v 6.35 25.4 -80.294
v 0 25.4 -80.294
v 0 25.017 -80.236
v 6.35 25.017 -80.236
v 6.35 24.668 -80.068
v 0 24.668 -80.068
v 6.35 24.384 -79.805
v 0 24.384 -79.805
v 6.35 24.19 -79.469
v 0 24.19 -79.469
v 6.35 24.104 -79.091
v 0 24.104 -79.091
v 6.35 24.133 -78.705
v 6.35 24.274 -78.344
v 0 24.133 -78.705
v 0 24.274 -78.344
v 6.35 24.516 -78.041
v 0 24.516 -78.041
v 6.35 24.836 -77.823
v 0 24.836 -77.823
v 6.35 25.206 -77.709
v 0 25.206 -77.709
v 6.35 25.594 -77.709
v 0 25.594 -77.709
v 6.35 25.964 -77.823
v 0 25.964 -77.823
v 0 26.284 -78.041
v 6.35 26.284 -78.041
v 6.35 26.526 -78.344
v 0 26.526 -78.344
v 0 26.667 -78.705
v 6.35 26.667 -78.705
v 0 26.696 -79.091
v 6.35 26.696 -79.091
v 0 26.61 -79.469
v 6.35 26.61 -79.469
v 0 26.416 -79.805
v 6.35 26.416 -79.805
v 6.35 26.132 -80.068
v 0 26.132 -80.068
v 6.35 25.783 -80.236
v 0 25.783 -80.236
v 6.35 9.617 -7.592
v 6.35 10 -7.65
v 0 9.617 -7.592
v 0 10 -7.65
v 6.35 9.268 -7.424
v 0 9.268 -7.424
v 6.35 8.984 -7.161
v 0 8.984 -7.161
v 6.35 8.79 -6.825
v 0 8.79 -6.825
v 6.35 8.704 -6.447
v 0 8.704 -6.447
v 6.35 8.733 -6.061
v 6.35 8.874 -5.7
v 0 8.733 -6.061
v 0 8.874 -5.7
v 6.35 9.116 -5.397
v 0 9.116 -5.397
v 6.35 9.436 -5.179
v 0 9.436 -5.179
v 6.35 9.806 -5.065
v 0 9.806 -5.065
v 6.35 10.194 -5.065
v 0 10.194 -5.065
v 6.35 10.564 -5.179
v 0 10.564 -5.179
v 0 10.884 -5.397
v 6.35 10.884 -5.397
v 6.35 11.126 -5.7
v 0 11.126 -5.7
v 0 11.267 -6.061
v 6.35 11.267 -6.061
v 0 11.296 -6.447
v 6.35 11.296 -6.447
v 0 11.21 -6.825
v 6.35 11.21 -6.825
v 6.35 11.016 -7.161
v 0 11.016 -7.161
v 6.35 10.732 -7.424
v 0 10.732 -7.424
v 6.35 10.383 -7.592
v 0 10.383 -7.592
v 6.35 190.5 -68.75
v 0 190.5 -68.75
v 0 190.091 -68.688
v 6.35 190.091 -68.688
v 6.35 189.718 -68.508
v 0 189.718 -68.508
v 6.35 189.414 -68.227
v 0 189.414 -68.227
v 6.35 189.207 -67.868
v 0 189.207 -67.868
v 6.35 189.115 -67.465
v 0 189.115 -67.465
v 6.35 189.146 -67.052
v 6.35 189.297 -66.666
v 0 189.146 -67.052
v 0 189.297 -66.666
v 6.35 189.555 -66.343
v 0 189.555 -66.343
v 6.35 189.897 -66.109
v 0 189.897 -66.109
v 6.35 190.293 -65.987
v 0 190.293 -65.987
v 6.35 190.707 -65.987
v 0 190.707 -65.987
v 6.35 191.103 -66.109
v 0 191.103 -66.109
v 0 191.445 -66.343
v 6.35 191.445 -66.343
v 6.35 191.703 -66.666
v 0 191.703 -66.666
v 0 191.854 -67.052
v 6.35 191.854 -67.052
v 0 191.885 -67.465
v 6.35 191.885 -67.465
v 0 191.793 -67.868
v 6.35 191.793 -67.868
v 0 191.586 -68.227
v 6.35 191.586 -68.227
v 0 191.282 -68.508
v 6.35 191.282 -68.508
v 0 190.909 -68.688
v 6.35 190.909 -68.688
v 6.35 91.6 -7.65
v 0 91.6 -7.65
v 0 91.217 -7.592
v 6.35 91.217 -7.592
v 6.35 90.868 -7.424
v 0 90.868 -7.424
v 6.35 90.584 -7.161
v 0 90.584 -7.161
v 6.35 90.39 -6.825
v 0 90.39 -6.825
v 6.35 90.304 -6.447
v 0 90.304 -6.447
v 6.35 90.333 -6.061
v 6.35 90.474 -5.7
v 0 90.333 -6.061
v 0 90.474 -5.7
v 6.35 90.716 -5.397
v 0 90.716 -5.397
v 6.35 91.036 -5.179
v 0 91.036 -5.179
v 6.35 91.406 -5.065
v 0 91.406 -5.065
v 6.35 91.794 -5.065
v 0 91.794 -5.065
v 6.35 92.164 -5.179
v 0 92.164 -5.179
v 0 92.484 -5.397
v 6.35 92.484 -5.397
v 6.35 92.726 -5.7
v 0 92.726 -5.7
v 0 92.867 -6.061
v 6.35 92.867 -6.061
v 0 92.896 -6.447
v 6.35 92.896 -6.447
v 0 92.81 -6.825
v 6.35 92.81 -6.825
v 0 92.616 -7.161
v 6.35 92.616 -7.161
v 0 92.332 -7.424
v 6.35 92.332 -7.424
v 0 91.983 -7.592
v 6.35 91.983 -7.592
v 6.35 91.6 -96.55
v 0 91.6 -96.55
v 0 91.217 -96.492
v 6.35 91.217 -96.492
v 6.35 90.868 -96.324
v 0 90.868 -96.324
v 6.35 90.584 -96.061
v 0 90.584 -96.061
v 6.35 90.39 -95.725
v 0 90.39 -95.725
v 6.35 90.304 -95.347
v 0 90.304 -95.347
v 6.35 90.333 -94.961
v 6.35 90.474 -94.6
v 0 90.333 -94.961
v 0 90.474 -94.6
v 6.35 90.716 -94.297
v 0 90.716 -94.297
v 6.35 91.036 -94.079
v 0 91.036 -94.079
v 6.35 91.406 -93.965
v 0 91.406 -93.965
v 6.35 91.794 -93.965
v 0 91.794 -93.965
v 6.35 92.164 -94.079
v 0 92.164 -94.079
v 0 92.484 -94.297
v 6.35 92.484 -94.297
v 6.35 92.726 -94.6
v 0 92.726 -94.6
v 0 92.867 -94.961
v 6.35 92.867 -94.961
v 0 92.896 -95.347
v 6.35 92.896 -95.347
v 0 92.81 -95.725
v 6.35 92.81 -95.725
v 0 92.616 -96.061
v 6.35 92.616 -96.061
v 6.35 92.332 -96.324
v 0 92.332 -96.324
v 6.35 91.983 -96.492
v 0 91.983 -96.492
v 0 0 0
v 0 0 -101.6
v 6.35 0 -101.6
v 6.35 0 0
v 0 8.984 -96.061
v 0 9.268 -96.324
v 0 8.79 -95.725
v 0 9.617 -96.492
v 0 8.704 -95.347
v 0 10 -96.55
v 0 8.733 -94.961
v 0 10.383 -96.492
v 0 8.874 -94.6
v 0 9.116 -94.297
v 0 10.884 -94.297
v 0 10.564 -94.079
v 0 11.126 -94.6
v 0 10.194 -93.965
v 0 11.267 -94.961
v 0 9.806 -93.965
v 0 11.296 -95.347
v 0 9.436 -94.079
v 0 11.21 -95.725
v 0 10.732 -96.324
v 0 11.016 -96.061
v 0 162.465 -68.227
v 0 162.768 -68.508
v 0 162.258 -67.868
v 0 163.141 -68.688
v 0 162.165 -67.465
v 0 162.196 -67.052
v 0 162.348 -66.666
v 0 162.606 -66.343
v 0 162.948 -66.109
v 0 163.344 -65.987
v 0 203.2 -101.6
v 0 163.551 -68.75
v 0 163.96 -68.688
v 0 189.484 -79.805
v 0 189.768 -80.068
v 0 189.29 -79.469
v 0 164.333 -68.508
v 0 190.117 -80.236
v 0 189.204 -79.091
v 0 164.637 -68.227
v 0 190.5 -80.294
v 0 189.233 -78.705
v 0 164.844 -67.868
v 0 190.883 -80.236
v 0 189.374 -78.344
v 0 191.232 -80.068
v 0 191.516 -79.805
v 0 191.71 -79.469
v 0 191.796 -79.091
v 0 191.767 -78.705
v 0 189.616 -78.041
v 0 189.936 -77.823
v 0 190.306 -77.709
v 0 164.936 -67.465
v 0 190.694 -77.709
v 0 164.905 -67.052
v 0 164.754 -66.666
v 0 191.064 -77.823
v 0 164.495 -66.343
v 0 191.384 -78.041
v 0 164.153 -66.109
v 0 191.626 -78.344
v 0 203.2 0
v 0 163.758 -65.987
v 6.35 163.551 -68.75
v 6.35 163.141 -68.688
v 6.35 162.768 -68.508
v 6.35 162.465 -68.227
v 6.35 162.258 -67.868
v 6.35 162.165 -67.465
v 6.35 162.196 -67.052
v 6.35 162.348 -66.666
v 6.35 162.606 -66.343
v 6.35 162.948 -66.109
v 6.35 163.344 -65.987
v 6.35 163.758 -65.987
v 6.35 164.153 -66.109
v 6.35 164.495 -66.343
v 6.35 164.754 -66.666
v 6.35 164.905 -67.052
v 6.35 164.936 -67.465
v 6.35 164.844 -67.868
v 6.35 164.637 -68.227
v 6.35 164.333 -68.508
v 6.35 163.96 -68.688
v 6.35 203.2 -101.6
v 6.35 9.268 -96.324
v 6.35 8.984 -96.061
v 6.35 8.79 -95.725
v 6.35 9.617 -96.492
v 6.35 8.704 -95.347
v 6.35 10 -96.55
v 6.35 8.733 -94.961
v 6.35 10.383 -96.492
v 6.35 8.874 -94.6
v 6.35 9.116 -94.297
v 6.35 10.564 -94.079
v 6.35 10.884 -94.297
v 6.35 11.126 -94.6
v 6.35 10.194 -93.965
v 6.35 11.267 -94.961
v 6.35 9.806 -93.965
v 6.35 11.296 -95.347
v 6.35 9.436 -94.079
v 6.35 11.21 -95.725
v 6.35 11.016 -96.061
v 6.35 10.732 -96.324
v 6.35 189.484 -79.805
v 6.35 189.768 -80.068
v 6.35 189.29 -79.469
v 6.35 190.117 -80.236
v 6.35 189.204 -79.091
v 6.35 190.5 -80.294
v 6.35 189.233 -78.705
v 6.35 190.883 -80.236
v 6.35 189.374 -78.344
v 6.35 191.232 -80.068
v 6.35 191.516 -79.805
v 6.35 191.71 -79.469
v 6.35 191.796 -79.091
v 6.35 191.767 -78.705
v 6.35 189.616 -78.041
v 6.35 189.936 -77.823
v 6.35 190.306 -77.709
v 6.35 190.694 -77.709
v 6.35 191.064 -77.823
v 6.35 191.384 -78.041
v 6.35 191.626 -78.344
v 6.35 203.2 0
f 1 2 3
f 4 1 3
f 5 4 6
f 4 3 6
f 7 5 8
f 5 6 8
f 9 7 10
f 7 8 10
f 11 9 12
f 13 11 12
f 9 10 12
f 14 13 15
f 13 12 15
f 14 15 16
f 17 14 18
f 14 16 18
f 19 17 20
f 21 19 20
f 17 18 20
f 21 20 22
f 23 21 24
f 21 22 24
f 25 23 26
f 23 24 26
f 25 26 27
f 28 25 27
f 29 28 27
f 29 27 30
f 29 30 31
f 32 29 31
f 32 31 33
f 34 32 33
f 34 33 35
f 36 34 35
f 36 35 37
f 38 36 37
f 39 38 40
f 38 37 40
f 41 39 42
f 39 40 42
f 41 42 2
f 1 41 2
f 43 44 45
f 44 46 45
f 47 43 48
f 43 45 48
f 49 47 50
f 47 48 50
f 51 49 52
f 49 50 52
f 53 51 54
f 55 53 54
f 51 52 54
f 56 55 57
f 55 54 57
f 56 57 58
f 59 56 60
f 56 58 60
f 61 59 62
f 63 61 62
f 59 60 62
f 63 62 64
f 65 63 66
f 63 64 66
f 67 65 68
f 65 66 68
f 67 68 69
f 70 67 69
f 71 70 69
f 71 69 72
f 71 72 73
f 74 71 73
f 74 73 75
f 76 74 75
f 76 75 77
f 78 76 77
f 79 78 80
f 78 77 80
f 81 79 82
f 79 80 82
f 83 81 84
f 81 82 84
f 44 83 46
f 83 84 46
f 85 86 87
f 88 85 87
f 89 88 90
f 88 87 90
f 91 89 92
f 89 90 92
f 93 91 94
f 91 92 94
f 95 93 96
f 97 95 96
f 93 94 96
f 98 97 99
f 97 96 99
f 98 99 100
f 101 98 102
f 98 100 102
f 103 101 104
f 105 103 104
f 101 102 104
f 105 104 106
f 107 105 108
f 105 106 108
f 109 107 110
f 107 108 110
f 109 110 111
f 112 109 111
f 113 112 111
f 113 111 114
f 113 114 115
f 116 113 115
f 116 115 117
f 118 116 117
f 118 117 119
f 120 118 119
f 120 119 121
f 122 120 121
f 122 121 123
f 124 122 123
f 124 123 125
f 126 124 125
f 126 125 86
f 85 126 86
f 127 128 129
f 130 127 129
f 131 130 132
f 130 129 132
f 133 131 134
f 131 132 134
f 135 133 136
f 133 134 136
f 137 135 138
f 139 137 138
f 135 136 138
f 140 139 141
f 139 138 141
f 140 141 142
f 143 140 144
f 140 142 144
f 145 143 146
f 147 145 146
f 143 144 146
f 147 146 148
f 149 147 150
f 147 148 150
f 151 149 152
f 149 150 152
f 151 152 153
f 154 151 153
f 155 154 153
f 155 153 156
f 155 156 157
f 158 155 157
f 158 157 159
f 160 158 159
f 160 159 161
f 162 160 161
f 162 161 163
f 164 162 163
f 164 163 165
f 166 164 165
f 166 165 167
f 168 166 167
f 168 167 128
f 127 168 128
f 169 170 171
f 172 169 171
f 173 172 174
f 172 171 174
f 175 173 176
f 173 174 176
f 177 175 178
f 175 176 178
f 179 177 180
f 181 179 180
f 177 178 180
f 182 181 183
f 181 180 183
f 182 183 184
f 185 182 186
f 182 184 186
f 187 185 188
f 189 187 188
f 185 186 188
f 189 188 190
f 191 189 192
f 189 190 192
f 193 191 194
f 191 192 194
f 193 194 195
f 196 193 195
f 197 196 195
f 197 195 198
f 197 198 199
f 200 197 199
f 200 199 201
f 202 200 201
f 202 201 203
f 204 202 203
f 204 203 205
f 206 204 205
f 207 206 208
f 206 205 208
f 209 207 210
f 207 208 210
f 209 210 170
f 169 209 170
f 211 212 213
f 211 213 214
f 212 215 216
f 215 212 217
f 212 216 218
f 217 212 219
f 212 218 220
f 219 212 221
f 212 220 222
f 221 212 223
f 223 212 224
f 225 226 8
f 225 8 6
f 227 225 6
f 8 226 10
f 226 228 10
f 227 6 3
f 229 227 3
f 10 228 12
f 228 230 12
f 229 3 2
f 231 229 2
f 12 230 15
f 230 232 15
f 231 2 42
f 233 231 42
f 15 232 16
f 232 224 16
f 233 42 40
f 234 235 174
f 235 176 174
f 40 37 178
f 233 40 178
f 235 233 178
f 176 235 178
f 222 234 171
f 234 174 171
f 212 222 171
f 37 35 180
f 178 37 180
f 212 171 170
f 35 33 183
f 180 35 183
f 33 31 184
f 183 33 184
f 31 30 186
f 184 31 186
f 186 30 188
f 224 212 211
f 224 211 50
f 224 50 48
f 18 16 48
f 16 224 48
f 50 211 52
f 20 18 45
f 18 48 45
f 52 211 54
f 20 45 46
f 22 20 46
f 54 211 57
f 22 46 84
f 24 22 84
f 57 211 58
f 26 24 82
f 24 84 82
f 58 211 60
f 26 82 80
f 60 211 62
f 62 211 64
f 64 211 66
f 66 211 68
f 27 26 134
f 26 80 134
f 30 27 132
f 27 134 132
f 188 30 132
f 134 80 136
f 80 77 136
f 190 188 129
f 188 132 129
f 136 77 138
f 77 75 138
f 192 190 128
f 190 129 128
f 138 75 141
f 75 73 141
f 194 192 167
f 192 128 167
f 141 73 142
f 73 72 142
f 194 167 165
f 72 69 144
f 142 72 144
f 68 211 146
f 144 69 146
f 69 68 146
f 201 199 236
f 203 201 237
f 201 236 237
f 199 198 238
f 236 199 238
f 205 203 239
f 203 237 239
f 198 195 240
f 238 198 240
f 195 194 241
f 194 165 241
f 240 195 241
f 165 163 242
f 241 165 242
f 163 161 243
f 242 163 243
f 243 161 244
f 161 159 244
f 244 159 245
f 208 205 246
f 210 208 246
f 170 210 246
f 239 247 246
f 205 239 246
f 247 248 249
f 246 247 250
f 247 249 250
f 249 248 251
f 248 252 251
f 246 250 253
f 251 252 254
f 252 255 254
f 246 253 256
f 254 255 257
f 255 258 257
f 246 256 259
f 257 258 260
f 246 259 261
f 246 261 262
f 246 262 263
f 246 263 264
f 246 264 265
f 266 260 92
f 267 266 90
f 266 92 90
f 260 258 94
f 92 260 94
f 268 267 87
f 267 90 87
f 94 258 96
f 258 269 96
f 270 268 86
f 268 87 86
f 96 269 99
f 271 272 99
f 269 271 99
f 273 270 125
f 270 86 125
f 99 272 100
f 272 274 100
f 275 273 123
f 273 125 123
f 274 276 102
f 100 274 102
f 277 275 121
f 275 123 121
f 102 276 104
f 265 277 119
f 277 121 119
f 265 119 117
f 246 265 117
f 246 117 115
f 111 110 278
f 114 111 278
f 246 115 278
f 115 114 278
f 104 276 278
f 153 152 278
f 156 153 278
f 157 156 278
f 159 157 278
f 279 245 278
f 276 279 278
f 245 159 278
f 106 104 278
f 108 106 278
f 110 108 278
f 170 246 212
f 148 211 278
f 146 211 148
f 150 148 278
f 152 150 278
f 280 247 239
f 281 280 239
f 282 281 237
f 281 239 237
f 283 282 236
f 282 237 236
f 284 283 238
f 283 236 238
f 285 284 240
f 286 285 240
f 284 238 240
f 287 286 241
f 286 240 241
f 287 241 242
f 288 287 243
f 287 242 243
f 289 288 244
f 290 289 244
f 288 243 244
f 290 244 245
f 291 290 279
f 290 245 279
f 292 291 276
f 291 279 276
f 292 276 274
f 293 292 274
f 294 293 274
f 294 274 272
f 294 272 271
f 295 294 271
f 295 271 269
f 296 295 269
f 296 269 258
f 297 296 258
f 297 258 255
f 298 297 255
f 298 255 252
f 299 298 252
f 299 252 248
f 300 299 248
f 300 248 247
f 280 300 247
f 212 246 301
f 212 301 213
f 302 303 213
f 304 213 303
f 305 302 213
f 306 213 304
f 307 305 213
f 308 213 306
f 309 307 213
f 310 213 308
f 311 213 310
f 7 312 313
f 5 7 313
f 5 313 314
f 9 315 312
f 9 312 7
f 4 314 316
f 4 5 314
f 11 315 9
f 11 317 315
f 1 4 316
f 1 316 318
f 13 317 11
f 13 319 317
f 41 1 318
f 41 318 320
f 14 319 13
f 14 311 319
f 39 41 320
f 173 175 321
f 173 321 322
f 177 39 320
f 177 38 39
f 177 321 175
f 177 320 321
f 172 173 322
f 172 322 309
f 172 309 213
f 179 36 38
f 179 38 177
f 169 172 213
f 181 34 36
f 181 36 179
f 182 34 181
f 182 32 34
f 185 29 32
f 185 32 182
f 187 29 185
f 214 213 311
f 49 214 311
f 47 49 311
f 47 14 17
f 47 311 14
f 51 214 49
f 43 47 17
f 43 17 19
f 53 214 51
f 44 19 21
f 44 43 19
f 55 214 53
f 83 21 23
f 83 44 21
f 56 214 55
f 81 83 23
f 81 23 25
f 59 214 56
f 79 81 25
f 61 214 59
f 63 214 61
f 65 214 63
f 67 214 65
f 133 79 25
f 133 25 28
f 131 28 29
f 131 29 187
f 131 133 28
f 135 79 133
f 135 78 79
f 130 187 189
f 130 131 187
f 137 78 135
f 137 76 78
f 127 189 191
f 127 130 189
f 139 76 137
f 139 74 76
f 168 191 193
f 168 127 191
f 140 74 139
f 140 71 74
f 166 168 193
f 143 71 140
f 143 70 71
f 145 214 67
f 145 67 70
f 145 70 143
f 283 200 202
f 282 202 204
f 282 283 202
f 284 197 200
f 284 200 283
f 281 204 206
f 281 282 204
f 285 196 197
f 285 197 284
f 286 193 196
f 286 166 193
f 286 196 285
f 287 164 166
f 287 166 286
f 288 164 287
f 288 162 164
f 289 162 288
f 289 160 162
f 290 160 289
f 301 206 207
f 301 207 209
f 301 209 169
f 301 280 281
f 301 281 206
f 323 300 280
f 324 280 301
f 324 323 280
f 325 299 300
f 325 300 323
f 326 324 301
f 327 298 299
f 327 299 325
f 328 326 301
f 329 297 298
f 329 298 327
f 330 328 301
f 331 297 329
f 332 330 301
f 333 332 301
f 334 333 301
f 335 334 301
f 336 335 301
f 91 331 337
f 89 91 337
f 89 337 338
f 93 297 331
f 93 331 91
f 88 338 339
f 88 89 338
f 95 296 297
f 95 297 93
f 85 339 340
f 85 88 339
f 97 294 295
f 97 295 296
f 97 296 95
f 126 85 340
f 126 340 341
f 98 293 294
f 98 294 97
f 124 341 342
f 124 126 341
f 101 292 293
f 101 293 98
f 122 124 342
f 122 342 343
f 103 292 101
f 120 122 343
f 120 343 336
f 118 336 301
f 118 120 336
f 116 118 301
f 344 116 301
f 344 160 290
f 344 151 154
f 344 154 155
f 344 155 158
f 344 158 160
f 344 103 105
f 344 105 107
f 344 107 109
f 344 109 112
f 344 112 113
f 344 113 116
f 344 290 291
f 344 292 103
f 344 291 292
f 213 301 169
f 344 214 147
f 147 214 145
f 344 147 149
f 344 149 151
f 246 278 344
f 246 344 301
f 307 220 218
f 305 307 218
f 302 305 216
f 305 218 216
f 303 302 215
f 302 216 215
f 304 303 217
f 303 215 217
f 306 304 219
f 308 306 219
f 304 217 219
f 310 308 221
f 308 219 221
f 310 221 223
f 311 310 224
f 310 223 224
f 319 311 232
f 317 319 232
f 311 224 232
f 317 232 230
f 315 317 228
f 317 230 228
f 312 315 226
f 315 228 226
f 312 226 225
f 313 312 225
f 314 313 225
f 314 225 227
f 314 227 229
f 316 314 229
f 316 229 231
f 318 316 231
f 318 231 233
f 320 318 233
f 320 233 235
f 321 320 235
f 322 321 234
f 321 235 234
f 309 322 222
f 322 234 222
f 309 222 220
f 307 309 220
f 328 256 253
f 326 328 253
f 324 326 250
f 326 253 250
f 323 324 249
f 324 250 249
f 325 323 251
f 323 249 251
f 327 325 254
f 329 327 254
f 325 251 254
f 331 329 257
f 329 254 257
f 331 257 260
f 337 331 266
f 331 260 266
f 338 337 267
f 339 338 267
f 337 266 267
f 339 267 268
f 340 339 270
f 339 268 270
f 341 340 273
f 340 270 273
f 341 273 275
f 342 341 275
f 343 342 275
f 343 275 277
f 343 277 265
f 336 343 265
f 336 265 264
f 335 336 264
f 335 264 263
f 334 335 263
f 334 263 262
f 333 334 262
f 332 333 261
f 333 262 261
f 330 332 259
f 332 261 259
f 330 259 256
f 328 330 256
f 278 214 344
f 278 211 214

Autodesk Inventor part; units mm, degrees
ref_plane "YZ Plane" through (0, 0, 0) normal (1, 0, 0) x (0, 1, 0)
ref_plane "XZ Plane" through (0, 0, 0) normal (0, 1, 0) x (-1, 0, 0)
ref_plane "XY Plane" through (0, 0, 0) normal (0, 0, 1) x (1, 0, 0)
sketch "Sketch1" plane through (0, 0, 0) normal (1, 0, 0) x (0, 1, 0)
  line L0 (0, 0) -> (203.2, 0)
  line L1 (203.2, 0) -> (203.2, -101.6)
  line L2 (203.2, -101.6) -> (0, -101.6)
  line L3 (0, -101.6) -> (0, 0)
  dimension "d0" = 203.2
  dimension "d1" = 101.6
extrude "Extrusion1" add sketch "Sketch1" along normal blind 6.35
sketch "Sketch2" plane through (6.35, 0, 0) normal (1, 0, 0) x (0, 0, -1)
  line L0 (0, 0) -> (101.6, 0) projected
  line L1 (0, 203.2) -> (0, 0) projected
  line L2 (101.6, 0) -> (101.6, 203.2) projected
  line L3 (101.6, 203.2) -> (0, 203.2) projected
  point P0 (78.994, 25.4)
  point P1 (78.994, 190.5)
  dimension "d4" = 25.4
  dimension "d5" = 78.994
  dimension "d6" = 12.7
  dimension "d7" = 78.994
hole "Hole1" at (6.35, 25.4, -78.994) at (6.35, 190.5, -78.994) direction (-1, 0, 0) diameter 2.6 end through all
sketch "Sketch3" plane through (6.35, 0, 0) normal (1, 0, 0) x (0, 0, -1)
  line L0 (0, 203.2) -> (0, 0) projected
  line L1 (0, 0) -> (101.6, 0) projected
  line L2 (101.6, 0) -> (101.6, 203.2) projected
  line L3 (101.6, 203.2) -> (0, 203.2) projected
  point P0 (6.35, 10)
  point P1 (95.25, 10)
  point P2 (6.35, 91.6)
  point P3 (95.25, 91.6)
  dimension "d15" = 10
  dimension "d16" = 10
  dimension "d17" = 6.35
  dimension "d18" = 6.35
  dimension "d19" = 91.6
  dimension "d20" = 6.35
  dimension "d21" = 6.35
  dimension "d22" = 91.6
hole "Hole2" at (6.35, 10, -6.35) at (6.35, 10, -95.25) at (6.35, 91.6, -6.35) at (6.35, 91.6, -95.25) direction (-1, 0, 0) diameter 2.6 end through all
sketch "Sketch4" plane through (6.35, 0, 0) normal (1, 0, 0) x (0, 0, -1)
  line L0 (101.6, 203.2) -> (0, 203.2) projected
  line L1 (0, 203.2) -> (0, 0) projected
  line L2 (101.6, 0) -> (101.6, 203.2) projected
  line L3 (0, 0) -> (101.6, 0) projected
  circle A0 centre (78.994, 190.5) radius 1.3 projected
  point P0 (67.3608, 190.5)
  point P1 (67.3608, 163.5506)
  dimension "d30" = 12.7
  dimension "d32" = 26.9494
  dimension "d41" = 67.3608
  dimension "d42" = 67.3608
hole "Hole3" at (6.35, 190.5, -67.3608) at (6.35, 163.5506, -67.3608) direction (-1, 0, 0) diameter 2.7781 end through all
properties part number "LiftPlate"
